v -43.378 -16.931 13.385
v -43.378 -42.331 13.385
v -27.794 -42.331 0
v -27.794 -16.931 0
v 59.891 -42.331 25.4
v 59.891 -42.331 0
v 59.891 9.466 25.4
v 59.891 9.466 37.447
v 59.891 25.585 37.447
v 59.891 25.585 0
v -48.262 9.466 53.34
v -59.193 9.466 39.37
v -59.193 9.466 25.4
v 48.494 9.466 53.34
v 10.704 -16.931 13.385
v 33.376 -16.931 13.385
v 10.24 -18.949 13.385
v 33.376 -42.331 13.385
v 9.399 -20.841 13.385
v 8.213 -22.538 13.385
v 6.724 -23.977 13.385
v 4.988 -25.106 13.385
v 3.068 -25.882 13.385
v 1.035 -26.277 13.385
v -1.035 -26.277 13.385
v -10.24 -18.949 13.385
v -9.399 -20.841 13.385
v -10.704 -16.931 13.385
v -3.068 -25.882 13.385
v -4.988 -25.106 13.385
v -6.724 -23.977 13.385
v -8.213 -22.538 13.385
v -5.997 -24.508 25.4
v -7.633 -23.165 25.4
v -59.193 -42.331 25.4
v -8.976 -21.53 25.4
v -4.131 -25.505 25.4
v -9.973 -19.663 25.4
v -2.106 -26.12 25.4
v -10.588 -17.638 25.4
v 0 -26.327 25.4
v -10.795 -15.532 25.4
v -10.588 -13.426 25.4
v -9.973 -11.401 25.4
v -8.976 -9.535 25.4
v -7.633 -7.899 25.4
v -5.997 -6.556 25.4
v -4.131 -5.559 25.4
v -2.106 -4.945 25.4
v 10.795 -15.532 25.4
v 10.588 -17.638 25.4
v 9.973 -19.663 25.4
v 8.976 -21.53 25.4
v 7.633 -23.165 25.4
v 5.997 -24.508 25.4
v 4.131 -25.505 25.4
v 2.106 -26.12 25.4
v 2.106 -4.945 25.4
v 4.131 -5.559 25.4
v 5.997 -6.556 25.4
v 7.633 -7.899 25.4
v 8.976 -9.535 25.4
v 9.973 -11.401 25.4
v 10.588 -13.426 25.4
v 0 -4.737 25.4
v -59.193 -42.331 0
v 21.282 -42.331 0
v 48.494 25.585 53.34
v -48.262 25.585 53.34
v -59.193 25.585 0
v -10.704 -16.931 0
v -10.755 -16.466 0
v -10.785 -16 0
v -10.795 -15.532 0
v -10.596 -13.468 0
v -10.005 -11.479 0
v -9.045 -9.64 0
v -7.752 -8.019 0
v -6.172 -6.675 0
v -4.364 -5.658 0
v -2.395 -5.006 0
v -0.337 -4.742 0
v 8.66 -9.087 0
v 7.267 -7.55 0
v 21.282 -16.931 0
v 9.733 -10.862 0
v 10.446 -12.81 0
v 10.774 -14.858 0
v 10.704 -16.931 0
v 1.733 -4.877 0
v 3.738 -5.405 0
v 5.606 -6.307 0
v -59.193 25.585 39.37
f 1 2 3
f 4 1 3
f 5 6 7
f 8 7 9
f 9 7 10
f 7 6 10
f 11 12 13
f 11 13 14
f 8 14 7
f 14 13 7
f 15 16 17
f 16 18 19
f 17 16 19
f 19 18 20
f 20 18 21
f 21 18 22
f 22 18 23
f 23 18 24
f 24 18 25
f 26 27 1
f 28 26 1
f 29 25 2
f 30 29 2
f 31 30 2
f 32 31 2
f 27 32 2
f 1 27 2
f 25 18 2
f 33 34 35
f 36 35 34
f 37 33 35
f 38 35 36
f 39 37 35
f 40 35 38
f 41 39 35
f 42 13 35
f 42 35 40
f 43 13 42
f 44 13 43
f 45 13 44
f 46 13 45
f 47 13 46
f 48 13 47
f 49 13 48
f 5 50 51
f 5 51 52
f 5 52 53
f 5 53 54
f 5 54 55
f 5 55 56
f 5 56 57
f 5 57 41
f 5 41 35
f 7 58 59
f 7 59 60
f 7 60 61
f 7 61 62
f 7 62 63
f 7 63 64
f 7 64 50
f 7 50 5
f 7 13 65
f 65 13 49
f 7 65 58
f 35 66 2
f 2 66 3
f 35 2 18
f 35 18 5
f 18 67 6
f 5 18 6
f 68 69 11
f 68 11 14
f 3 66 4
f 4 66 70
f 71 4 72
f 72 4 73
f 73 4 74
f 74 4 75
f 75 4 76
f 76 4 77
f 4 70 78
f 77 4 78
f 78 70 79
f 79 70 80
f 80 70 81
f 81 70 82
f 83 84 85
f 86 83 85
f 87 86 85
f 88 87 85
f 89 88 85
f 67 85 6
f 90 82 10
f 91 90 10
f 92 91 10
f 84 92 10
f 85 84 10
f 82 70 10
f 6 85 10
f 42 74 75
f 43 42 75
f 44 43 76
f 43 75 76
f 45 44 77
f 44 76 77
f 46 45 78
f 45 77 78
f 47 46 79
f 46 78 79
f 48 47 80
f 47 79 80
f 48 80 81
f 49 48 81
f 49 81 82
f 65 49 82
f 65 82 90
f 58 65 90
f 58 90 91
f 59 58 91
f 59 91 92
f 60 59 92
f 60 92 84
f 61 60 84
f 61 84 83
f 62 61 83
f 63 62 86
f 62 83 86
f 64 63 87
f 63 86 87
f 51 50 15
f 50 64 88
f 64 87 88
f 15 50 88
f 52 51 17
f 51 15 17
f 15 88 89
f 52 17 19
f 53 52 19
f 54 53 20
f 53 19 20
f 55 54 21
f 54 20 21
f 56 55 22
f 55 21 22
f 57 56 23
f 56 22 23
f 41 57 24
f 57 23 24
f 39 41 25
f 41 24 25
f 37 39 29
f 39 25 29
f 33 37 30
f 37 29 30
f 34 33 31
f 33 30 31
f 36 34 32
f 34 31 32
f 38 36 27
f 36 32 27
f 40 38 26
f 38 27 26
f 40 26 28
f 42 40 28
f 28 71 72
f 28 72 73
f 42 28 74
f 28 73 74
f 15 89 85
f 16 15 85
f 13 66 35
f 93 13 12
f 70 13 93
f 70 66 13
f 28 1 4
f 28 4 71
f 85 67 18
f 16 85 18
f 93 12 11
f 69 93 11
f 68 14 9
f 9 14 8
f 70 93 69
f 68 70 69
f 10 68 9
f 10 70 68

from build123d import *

# Parameters (mm, degrees)
F0_W     = 119.084648788
F0_H     = 67.9154656827
F1_DEPTH = 25.4
F3_DEPTH = 25.4
F4_W     = 119.084648788
F4_H     = 16.1182302982
F5_DEPTH = 27.94
F7_DEPTH = 25.4
F9_DEPTH = 25.4
F12_D    = 21.59


with BuildPart() as f1:
    # F0 (on Top) → F1 (new body)
    with BuildSketch(Plane.XY):
        with Locations((0.348880887, -8.3731394261)):
            Rectangle(F0_W, F0_H)
    extrude(amount=F1_DEPTH)

    # F2 (on face) → F3 (cut)
    with BuildSketch(Plane.XZ.offset(42.3308722675)):
        Polygon((-43.3775149286, 13.3852101862), (-27.7941711247, 0), (21.2817266583, 0), (33.3762653172, 13.3852101862), align=None)
    extrude(amount=-F3_DEPTH, mode=Mode.SUBTRACT)

    # F4 (on face) → F5 (join)
    with BuildSketch(Plane.XY.offset(25.4)):
        with Locations((0.348880887, 17.5254782662)):
            Rectangle(F4_W, F4_H)
    extrude(amount=F5_DEPTH)

    # F6 (on face) → F7 (cut)
    with BuildSketch(Plane.XZ.offset(-9.4663631171)):
        Polygon((-59.193443507, 39.37), (-48.261847347, 53.34), (-59.193443507, 53.34), align=None)
    extrude(amount=-F7_DEPTH, mode=Mode.SUBTRACT)

    # F8 (on face) → F9 (cut)
    with BuildSketch(Plane.XZ.offset(-9.4663631171)):
        Polygon((59.891205281, 53.34), (48.4944358468, 53.34), (59.891205281, 37.4465435743), align=None)
    extrude(amount=-F9_DEPTH, mode=Mode.SUBTRACT)

    # F12 (through all)
    with Locations(Plane.XY.offset(25.4)):
        with Locations((0, -15.5321601778)):
            Hole(F12_D / 2)


solid = f1.part
